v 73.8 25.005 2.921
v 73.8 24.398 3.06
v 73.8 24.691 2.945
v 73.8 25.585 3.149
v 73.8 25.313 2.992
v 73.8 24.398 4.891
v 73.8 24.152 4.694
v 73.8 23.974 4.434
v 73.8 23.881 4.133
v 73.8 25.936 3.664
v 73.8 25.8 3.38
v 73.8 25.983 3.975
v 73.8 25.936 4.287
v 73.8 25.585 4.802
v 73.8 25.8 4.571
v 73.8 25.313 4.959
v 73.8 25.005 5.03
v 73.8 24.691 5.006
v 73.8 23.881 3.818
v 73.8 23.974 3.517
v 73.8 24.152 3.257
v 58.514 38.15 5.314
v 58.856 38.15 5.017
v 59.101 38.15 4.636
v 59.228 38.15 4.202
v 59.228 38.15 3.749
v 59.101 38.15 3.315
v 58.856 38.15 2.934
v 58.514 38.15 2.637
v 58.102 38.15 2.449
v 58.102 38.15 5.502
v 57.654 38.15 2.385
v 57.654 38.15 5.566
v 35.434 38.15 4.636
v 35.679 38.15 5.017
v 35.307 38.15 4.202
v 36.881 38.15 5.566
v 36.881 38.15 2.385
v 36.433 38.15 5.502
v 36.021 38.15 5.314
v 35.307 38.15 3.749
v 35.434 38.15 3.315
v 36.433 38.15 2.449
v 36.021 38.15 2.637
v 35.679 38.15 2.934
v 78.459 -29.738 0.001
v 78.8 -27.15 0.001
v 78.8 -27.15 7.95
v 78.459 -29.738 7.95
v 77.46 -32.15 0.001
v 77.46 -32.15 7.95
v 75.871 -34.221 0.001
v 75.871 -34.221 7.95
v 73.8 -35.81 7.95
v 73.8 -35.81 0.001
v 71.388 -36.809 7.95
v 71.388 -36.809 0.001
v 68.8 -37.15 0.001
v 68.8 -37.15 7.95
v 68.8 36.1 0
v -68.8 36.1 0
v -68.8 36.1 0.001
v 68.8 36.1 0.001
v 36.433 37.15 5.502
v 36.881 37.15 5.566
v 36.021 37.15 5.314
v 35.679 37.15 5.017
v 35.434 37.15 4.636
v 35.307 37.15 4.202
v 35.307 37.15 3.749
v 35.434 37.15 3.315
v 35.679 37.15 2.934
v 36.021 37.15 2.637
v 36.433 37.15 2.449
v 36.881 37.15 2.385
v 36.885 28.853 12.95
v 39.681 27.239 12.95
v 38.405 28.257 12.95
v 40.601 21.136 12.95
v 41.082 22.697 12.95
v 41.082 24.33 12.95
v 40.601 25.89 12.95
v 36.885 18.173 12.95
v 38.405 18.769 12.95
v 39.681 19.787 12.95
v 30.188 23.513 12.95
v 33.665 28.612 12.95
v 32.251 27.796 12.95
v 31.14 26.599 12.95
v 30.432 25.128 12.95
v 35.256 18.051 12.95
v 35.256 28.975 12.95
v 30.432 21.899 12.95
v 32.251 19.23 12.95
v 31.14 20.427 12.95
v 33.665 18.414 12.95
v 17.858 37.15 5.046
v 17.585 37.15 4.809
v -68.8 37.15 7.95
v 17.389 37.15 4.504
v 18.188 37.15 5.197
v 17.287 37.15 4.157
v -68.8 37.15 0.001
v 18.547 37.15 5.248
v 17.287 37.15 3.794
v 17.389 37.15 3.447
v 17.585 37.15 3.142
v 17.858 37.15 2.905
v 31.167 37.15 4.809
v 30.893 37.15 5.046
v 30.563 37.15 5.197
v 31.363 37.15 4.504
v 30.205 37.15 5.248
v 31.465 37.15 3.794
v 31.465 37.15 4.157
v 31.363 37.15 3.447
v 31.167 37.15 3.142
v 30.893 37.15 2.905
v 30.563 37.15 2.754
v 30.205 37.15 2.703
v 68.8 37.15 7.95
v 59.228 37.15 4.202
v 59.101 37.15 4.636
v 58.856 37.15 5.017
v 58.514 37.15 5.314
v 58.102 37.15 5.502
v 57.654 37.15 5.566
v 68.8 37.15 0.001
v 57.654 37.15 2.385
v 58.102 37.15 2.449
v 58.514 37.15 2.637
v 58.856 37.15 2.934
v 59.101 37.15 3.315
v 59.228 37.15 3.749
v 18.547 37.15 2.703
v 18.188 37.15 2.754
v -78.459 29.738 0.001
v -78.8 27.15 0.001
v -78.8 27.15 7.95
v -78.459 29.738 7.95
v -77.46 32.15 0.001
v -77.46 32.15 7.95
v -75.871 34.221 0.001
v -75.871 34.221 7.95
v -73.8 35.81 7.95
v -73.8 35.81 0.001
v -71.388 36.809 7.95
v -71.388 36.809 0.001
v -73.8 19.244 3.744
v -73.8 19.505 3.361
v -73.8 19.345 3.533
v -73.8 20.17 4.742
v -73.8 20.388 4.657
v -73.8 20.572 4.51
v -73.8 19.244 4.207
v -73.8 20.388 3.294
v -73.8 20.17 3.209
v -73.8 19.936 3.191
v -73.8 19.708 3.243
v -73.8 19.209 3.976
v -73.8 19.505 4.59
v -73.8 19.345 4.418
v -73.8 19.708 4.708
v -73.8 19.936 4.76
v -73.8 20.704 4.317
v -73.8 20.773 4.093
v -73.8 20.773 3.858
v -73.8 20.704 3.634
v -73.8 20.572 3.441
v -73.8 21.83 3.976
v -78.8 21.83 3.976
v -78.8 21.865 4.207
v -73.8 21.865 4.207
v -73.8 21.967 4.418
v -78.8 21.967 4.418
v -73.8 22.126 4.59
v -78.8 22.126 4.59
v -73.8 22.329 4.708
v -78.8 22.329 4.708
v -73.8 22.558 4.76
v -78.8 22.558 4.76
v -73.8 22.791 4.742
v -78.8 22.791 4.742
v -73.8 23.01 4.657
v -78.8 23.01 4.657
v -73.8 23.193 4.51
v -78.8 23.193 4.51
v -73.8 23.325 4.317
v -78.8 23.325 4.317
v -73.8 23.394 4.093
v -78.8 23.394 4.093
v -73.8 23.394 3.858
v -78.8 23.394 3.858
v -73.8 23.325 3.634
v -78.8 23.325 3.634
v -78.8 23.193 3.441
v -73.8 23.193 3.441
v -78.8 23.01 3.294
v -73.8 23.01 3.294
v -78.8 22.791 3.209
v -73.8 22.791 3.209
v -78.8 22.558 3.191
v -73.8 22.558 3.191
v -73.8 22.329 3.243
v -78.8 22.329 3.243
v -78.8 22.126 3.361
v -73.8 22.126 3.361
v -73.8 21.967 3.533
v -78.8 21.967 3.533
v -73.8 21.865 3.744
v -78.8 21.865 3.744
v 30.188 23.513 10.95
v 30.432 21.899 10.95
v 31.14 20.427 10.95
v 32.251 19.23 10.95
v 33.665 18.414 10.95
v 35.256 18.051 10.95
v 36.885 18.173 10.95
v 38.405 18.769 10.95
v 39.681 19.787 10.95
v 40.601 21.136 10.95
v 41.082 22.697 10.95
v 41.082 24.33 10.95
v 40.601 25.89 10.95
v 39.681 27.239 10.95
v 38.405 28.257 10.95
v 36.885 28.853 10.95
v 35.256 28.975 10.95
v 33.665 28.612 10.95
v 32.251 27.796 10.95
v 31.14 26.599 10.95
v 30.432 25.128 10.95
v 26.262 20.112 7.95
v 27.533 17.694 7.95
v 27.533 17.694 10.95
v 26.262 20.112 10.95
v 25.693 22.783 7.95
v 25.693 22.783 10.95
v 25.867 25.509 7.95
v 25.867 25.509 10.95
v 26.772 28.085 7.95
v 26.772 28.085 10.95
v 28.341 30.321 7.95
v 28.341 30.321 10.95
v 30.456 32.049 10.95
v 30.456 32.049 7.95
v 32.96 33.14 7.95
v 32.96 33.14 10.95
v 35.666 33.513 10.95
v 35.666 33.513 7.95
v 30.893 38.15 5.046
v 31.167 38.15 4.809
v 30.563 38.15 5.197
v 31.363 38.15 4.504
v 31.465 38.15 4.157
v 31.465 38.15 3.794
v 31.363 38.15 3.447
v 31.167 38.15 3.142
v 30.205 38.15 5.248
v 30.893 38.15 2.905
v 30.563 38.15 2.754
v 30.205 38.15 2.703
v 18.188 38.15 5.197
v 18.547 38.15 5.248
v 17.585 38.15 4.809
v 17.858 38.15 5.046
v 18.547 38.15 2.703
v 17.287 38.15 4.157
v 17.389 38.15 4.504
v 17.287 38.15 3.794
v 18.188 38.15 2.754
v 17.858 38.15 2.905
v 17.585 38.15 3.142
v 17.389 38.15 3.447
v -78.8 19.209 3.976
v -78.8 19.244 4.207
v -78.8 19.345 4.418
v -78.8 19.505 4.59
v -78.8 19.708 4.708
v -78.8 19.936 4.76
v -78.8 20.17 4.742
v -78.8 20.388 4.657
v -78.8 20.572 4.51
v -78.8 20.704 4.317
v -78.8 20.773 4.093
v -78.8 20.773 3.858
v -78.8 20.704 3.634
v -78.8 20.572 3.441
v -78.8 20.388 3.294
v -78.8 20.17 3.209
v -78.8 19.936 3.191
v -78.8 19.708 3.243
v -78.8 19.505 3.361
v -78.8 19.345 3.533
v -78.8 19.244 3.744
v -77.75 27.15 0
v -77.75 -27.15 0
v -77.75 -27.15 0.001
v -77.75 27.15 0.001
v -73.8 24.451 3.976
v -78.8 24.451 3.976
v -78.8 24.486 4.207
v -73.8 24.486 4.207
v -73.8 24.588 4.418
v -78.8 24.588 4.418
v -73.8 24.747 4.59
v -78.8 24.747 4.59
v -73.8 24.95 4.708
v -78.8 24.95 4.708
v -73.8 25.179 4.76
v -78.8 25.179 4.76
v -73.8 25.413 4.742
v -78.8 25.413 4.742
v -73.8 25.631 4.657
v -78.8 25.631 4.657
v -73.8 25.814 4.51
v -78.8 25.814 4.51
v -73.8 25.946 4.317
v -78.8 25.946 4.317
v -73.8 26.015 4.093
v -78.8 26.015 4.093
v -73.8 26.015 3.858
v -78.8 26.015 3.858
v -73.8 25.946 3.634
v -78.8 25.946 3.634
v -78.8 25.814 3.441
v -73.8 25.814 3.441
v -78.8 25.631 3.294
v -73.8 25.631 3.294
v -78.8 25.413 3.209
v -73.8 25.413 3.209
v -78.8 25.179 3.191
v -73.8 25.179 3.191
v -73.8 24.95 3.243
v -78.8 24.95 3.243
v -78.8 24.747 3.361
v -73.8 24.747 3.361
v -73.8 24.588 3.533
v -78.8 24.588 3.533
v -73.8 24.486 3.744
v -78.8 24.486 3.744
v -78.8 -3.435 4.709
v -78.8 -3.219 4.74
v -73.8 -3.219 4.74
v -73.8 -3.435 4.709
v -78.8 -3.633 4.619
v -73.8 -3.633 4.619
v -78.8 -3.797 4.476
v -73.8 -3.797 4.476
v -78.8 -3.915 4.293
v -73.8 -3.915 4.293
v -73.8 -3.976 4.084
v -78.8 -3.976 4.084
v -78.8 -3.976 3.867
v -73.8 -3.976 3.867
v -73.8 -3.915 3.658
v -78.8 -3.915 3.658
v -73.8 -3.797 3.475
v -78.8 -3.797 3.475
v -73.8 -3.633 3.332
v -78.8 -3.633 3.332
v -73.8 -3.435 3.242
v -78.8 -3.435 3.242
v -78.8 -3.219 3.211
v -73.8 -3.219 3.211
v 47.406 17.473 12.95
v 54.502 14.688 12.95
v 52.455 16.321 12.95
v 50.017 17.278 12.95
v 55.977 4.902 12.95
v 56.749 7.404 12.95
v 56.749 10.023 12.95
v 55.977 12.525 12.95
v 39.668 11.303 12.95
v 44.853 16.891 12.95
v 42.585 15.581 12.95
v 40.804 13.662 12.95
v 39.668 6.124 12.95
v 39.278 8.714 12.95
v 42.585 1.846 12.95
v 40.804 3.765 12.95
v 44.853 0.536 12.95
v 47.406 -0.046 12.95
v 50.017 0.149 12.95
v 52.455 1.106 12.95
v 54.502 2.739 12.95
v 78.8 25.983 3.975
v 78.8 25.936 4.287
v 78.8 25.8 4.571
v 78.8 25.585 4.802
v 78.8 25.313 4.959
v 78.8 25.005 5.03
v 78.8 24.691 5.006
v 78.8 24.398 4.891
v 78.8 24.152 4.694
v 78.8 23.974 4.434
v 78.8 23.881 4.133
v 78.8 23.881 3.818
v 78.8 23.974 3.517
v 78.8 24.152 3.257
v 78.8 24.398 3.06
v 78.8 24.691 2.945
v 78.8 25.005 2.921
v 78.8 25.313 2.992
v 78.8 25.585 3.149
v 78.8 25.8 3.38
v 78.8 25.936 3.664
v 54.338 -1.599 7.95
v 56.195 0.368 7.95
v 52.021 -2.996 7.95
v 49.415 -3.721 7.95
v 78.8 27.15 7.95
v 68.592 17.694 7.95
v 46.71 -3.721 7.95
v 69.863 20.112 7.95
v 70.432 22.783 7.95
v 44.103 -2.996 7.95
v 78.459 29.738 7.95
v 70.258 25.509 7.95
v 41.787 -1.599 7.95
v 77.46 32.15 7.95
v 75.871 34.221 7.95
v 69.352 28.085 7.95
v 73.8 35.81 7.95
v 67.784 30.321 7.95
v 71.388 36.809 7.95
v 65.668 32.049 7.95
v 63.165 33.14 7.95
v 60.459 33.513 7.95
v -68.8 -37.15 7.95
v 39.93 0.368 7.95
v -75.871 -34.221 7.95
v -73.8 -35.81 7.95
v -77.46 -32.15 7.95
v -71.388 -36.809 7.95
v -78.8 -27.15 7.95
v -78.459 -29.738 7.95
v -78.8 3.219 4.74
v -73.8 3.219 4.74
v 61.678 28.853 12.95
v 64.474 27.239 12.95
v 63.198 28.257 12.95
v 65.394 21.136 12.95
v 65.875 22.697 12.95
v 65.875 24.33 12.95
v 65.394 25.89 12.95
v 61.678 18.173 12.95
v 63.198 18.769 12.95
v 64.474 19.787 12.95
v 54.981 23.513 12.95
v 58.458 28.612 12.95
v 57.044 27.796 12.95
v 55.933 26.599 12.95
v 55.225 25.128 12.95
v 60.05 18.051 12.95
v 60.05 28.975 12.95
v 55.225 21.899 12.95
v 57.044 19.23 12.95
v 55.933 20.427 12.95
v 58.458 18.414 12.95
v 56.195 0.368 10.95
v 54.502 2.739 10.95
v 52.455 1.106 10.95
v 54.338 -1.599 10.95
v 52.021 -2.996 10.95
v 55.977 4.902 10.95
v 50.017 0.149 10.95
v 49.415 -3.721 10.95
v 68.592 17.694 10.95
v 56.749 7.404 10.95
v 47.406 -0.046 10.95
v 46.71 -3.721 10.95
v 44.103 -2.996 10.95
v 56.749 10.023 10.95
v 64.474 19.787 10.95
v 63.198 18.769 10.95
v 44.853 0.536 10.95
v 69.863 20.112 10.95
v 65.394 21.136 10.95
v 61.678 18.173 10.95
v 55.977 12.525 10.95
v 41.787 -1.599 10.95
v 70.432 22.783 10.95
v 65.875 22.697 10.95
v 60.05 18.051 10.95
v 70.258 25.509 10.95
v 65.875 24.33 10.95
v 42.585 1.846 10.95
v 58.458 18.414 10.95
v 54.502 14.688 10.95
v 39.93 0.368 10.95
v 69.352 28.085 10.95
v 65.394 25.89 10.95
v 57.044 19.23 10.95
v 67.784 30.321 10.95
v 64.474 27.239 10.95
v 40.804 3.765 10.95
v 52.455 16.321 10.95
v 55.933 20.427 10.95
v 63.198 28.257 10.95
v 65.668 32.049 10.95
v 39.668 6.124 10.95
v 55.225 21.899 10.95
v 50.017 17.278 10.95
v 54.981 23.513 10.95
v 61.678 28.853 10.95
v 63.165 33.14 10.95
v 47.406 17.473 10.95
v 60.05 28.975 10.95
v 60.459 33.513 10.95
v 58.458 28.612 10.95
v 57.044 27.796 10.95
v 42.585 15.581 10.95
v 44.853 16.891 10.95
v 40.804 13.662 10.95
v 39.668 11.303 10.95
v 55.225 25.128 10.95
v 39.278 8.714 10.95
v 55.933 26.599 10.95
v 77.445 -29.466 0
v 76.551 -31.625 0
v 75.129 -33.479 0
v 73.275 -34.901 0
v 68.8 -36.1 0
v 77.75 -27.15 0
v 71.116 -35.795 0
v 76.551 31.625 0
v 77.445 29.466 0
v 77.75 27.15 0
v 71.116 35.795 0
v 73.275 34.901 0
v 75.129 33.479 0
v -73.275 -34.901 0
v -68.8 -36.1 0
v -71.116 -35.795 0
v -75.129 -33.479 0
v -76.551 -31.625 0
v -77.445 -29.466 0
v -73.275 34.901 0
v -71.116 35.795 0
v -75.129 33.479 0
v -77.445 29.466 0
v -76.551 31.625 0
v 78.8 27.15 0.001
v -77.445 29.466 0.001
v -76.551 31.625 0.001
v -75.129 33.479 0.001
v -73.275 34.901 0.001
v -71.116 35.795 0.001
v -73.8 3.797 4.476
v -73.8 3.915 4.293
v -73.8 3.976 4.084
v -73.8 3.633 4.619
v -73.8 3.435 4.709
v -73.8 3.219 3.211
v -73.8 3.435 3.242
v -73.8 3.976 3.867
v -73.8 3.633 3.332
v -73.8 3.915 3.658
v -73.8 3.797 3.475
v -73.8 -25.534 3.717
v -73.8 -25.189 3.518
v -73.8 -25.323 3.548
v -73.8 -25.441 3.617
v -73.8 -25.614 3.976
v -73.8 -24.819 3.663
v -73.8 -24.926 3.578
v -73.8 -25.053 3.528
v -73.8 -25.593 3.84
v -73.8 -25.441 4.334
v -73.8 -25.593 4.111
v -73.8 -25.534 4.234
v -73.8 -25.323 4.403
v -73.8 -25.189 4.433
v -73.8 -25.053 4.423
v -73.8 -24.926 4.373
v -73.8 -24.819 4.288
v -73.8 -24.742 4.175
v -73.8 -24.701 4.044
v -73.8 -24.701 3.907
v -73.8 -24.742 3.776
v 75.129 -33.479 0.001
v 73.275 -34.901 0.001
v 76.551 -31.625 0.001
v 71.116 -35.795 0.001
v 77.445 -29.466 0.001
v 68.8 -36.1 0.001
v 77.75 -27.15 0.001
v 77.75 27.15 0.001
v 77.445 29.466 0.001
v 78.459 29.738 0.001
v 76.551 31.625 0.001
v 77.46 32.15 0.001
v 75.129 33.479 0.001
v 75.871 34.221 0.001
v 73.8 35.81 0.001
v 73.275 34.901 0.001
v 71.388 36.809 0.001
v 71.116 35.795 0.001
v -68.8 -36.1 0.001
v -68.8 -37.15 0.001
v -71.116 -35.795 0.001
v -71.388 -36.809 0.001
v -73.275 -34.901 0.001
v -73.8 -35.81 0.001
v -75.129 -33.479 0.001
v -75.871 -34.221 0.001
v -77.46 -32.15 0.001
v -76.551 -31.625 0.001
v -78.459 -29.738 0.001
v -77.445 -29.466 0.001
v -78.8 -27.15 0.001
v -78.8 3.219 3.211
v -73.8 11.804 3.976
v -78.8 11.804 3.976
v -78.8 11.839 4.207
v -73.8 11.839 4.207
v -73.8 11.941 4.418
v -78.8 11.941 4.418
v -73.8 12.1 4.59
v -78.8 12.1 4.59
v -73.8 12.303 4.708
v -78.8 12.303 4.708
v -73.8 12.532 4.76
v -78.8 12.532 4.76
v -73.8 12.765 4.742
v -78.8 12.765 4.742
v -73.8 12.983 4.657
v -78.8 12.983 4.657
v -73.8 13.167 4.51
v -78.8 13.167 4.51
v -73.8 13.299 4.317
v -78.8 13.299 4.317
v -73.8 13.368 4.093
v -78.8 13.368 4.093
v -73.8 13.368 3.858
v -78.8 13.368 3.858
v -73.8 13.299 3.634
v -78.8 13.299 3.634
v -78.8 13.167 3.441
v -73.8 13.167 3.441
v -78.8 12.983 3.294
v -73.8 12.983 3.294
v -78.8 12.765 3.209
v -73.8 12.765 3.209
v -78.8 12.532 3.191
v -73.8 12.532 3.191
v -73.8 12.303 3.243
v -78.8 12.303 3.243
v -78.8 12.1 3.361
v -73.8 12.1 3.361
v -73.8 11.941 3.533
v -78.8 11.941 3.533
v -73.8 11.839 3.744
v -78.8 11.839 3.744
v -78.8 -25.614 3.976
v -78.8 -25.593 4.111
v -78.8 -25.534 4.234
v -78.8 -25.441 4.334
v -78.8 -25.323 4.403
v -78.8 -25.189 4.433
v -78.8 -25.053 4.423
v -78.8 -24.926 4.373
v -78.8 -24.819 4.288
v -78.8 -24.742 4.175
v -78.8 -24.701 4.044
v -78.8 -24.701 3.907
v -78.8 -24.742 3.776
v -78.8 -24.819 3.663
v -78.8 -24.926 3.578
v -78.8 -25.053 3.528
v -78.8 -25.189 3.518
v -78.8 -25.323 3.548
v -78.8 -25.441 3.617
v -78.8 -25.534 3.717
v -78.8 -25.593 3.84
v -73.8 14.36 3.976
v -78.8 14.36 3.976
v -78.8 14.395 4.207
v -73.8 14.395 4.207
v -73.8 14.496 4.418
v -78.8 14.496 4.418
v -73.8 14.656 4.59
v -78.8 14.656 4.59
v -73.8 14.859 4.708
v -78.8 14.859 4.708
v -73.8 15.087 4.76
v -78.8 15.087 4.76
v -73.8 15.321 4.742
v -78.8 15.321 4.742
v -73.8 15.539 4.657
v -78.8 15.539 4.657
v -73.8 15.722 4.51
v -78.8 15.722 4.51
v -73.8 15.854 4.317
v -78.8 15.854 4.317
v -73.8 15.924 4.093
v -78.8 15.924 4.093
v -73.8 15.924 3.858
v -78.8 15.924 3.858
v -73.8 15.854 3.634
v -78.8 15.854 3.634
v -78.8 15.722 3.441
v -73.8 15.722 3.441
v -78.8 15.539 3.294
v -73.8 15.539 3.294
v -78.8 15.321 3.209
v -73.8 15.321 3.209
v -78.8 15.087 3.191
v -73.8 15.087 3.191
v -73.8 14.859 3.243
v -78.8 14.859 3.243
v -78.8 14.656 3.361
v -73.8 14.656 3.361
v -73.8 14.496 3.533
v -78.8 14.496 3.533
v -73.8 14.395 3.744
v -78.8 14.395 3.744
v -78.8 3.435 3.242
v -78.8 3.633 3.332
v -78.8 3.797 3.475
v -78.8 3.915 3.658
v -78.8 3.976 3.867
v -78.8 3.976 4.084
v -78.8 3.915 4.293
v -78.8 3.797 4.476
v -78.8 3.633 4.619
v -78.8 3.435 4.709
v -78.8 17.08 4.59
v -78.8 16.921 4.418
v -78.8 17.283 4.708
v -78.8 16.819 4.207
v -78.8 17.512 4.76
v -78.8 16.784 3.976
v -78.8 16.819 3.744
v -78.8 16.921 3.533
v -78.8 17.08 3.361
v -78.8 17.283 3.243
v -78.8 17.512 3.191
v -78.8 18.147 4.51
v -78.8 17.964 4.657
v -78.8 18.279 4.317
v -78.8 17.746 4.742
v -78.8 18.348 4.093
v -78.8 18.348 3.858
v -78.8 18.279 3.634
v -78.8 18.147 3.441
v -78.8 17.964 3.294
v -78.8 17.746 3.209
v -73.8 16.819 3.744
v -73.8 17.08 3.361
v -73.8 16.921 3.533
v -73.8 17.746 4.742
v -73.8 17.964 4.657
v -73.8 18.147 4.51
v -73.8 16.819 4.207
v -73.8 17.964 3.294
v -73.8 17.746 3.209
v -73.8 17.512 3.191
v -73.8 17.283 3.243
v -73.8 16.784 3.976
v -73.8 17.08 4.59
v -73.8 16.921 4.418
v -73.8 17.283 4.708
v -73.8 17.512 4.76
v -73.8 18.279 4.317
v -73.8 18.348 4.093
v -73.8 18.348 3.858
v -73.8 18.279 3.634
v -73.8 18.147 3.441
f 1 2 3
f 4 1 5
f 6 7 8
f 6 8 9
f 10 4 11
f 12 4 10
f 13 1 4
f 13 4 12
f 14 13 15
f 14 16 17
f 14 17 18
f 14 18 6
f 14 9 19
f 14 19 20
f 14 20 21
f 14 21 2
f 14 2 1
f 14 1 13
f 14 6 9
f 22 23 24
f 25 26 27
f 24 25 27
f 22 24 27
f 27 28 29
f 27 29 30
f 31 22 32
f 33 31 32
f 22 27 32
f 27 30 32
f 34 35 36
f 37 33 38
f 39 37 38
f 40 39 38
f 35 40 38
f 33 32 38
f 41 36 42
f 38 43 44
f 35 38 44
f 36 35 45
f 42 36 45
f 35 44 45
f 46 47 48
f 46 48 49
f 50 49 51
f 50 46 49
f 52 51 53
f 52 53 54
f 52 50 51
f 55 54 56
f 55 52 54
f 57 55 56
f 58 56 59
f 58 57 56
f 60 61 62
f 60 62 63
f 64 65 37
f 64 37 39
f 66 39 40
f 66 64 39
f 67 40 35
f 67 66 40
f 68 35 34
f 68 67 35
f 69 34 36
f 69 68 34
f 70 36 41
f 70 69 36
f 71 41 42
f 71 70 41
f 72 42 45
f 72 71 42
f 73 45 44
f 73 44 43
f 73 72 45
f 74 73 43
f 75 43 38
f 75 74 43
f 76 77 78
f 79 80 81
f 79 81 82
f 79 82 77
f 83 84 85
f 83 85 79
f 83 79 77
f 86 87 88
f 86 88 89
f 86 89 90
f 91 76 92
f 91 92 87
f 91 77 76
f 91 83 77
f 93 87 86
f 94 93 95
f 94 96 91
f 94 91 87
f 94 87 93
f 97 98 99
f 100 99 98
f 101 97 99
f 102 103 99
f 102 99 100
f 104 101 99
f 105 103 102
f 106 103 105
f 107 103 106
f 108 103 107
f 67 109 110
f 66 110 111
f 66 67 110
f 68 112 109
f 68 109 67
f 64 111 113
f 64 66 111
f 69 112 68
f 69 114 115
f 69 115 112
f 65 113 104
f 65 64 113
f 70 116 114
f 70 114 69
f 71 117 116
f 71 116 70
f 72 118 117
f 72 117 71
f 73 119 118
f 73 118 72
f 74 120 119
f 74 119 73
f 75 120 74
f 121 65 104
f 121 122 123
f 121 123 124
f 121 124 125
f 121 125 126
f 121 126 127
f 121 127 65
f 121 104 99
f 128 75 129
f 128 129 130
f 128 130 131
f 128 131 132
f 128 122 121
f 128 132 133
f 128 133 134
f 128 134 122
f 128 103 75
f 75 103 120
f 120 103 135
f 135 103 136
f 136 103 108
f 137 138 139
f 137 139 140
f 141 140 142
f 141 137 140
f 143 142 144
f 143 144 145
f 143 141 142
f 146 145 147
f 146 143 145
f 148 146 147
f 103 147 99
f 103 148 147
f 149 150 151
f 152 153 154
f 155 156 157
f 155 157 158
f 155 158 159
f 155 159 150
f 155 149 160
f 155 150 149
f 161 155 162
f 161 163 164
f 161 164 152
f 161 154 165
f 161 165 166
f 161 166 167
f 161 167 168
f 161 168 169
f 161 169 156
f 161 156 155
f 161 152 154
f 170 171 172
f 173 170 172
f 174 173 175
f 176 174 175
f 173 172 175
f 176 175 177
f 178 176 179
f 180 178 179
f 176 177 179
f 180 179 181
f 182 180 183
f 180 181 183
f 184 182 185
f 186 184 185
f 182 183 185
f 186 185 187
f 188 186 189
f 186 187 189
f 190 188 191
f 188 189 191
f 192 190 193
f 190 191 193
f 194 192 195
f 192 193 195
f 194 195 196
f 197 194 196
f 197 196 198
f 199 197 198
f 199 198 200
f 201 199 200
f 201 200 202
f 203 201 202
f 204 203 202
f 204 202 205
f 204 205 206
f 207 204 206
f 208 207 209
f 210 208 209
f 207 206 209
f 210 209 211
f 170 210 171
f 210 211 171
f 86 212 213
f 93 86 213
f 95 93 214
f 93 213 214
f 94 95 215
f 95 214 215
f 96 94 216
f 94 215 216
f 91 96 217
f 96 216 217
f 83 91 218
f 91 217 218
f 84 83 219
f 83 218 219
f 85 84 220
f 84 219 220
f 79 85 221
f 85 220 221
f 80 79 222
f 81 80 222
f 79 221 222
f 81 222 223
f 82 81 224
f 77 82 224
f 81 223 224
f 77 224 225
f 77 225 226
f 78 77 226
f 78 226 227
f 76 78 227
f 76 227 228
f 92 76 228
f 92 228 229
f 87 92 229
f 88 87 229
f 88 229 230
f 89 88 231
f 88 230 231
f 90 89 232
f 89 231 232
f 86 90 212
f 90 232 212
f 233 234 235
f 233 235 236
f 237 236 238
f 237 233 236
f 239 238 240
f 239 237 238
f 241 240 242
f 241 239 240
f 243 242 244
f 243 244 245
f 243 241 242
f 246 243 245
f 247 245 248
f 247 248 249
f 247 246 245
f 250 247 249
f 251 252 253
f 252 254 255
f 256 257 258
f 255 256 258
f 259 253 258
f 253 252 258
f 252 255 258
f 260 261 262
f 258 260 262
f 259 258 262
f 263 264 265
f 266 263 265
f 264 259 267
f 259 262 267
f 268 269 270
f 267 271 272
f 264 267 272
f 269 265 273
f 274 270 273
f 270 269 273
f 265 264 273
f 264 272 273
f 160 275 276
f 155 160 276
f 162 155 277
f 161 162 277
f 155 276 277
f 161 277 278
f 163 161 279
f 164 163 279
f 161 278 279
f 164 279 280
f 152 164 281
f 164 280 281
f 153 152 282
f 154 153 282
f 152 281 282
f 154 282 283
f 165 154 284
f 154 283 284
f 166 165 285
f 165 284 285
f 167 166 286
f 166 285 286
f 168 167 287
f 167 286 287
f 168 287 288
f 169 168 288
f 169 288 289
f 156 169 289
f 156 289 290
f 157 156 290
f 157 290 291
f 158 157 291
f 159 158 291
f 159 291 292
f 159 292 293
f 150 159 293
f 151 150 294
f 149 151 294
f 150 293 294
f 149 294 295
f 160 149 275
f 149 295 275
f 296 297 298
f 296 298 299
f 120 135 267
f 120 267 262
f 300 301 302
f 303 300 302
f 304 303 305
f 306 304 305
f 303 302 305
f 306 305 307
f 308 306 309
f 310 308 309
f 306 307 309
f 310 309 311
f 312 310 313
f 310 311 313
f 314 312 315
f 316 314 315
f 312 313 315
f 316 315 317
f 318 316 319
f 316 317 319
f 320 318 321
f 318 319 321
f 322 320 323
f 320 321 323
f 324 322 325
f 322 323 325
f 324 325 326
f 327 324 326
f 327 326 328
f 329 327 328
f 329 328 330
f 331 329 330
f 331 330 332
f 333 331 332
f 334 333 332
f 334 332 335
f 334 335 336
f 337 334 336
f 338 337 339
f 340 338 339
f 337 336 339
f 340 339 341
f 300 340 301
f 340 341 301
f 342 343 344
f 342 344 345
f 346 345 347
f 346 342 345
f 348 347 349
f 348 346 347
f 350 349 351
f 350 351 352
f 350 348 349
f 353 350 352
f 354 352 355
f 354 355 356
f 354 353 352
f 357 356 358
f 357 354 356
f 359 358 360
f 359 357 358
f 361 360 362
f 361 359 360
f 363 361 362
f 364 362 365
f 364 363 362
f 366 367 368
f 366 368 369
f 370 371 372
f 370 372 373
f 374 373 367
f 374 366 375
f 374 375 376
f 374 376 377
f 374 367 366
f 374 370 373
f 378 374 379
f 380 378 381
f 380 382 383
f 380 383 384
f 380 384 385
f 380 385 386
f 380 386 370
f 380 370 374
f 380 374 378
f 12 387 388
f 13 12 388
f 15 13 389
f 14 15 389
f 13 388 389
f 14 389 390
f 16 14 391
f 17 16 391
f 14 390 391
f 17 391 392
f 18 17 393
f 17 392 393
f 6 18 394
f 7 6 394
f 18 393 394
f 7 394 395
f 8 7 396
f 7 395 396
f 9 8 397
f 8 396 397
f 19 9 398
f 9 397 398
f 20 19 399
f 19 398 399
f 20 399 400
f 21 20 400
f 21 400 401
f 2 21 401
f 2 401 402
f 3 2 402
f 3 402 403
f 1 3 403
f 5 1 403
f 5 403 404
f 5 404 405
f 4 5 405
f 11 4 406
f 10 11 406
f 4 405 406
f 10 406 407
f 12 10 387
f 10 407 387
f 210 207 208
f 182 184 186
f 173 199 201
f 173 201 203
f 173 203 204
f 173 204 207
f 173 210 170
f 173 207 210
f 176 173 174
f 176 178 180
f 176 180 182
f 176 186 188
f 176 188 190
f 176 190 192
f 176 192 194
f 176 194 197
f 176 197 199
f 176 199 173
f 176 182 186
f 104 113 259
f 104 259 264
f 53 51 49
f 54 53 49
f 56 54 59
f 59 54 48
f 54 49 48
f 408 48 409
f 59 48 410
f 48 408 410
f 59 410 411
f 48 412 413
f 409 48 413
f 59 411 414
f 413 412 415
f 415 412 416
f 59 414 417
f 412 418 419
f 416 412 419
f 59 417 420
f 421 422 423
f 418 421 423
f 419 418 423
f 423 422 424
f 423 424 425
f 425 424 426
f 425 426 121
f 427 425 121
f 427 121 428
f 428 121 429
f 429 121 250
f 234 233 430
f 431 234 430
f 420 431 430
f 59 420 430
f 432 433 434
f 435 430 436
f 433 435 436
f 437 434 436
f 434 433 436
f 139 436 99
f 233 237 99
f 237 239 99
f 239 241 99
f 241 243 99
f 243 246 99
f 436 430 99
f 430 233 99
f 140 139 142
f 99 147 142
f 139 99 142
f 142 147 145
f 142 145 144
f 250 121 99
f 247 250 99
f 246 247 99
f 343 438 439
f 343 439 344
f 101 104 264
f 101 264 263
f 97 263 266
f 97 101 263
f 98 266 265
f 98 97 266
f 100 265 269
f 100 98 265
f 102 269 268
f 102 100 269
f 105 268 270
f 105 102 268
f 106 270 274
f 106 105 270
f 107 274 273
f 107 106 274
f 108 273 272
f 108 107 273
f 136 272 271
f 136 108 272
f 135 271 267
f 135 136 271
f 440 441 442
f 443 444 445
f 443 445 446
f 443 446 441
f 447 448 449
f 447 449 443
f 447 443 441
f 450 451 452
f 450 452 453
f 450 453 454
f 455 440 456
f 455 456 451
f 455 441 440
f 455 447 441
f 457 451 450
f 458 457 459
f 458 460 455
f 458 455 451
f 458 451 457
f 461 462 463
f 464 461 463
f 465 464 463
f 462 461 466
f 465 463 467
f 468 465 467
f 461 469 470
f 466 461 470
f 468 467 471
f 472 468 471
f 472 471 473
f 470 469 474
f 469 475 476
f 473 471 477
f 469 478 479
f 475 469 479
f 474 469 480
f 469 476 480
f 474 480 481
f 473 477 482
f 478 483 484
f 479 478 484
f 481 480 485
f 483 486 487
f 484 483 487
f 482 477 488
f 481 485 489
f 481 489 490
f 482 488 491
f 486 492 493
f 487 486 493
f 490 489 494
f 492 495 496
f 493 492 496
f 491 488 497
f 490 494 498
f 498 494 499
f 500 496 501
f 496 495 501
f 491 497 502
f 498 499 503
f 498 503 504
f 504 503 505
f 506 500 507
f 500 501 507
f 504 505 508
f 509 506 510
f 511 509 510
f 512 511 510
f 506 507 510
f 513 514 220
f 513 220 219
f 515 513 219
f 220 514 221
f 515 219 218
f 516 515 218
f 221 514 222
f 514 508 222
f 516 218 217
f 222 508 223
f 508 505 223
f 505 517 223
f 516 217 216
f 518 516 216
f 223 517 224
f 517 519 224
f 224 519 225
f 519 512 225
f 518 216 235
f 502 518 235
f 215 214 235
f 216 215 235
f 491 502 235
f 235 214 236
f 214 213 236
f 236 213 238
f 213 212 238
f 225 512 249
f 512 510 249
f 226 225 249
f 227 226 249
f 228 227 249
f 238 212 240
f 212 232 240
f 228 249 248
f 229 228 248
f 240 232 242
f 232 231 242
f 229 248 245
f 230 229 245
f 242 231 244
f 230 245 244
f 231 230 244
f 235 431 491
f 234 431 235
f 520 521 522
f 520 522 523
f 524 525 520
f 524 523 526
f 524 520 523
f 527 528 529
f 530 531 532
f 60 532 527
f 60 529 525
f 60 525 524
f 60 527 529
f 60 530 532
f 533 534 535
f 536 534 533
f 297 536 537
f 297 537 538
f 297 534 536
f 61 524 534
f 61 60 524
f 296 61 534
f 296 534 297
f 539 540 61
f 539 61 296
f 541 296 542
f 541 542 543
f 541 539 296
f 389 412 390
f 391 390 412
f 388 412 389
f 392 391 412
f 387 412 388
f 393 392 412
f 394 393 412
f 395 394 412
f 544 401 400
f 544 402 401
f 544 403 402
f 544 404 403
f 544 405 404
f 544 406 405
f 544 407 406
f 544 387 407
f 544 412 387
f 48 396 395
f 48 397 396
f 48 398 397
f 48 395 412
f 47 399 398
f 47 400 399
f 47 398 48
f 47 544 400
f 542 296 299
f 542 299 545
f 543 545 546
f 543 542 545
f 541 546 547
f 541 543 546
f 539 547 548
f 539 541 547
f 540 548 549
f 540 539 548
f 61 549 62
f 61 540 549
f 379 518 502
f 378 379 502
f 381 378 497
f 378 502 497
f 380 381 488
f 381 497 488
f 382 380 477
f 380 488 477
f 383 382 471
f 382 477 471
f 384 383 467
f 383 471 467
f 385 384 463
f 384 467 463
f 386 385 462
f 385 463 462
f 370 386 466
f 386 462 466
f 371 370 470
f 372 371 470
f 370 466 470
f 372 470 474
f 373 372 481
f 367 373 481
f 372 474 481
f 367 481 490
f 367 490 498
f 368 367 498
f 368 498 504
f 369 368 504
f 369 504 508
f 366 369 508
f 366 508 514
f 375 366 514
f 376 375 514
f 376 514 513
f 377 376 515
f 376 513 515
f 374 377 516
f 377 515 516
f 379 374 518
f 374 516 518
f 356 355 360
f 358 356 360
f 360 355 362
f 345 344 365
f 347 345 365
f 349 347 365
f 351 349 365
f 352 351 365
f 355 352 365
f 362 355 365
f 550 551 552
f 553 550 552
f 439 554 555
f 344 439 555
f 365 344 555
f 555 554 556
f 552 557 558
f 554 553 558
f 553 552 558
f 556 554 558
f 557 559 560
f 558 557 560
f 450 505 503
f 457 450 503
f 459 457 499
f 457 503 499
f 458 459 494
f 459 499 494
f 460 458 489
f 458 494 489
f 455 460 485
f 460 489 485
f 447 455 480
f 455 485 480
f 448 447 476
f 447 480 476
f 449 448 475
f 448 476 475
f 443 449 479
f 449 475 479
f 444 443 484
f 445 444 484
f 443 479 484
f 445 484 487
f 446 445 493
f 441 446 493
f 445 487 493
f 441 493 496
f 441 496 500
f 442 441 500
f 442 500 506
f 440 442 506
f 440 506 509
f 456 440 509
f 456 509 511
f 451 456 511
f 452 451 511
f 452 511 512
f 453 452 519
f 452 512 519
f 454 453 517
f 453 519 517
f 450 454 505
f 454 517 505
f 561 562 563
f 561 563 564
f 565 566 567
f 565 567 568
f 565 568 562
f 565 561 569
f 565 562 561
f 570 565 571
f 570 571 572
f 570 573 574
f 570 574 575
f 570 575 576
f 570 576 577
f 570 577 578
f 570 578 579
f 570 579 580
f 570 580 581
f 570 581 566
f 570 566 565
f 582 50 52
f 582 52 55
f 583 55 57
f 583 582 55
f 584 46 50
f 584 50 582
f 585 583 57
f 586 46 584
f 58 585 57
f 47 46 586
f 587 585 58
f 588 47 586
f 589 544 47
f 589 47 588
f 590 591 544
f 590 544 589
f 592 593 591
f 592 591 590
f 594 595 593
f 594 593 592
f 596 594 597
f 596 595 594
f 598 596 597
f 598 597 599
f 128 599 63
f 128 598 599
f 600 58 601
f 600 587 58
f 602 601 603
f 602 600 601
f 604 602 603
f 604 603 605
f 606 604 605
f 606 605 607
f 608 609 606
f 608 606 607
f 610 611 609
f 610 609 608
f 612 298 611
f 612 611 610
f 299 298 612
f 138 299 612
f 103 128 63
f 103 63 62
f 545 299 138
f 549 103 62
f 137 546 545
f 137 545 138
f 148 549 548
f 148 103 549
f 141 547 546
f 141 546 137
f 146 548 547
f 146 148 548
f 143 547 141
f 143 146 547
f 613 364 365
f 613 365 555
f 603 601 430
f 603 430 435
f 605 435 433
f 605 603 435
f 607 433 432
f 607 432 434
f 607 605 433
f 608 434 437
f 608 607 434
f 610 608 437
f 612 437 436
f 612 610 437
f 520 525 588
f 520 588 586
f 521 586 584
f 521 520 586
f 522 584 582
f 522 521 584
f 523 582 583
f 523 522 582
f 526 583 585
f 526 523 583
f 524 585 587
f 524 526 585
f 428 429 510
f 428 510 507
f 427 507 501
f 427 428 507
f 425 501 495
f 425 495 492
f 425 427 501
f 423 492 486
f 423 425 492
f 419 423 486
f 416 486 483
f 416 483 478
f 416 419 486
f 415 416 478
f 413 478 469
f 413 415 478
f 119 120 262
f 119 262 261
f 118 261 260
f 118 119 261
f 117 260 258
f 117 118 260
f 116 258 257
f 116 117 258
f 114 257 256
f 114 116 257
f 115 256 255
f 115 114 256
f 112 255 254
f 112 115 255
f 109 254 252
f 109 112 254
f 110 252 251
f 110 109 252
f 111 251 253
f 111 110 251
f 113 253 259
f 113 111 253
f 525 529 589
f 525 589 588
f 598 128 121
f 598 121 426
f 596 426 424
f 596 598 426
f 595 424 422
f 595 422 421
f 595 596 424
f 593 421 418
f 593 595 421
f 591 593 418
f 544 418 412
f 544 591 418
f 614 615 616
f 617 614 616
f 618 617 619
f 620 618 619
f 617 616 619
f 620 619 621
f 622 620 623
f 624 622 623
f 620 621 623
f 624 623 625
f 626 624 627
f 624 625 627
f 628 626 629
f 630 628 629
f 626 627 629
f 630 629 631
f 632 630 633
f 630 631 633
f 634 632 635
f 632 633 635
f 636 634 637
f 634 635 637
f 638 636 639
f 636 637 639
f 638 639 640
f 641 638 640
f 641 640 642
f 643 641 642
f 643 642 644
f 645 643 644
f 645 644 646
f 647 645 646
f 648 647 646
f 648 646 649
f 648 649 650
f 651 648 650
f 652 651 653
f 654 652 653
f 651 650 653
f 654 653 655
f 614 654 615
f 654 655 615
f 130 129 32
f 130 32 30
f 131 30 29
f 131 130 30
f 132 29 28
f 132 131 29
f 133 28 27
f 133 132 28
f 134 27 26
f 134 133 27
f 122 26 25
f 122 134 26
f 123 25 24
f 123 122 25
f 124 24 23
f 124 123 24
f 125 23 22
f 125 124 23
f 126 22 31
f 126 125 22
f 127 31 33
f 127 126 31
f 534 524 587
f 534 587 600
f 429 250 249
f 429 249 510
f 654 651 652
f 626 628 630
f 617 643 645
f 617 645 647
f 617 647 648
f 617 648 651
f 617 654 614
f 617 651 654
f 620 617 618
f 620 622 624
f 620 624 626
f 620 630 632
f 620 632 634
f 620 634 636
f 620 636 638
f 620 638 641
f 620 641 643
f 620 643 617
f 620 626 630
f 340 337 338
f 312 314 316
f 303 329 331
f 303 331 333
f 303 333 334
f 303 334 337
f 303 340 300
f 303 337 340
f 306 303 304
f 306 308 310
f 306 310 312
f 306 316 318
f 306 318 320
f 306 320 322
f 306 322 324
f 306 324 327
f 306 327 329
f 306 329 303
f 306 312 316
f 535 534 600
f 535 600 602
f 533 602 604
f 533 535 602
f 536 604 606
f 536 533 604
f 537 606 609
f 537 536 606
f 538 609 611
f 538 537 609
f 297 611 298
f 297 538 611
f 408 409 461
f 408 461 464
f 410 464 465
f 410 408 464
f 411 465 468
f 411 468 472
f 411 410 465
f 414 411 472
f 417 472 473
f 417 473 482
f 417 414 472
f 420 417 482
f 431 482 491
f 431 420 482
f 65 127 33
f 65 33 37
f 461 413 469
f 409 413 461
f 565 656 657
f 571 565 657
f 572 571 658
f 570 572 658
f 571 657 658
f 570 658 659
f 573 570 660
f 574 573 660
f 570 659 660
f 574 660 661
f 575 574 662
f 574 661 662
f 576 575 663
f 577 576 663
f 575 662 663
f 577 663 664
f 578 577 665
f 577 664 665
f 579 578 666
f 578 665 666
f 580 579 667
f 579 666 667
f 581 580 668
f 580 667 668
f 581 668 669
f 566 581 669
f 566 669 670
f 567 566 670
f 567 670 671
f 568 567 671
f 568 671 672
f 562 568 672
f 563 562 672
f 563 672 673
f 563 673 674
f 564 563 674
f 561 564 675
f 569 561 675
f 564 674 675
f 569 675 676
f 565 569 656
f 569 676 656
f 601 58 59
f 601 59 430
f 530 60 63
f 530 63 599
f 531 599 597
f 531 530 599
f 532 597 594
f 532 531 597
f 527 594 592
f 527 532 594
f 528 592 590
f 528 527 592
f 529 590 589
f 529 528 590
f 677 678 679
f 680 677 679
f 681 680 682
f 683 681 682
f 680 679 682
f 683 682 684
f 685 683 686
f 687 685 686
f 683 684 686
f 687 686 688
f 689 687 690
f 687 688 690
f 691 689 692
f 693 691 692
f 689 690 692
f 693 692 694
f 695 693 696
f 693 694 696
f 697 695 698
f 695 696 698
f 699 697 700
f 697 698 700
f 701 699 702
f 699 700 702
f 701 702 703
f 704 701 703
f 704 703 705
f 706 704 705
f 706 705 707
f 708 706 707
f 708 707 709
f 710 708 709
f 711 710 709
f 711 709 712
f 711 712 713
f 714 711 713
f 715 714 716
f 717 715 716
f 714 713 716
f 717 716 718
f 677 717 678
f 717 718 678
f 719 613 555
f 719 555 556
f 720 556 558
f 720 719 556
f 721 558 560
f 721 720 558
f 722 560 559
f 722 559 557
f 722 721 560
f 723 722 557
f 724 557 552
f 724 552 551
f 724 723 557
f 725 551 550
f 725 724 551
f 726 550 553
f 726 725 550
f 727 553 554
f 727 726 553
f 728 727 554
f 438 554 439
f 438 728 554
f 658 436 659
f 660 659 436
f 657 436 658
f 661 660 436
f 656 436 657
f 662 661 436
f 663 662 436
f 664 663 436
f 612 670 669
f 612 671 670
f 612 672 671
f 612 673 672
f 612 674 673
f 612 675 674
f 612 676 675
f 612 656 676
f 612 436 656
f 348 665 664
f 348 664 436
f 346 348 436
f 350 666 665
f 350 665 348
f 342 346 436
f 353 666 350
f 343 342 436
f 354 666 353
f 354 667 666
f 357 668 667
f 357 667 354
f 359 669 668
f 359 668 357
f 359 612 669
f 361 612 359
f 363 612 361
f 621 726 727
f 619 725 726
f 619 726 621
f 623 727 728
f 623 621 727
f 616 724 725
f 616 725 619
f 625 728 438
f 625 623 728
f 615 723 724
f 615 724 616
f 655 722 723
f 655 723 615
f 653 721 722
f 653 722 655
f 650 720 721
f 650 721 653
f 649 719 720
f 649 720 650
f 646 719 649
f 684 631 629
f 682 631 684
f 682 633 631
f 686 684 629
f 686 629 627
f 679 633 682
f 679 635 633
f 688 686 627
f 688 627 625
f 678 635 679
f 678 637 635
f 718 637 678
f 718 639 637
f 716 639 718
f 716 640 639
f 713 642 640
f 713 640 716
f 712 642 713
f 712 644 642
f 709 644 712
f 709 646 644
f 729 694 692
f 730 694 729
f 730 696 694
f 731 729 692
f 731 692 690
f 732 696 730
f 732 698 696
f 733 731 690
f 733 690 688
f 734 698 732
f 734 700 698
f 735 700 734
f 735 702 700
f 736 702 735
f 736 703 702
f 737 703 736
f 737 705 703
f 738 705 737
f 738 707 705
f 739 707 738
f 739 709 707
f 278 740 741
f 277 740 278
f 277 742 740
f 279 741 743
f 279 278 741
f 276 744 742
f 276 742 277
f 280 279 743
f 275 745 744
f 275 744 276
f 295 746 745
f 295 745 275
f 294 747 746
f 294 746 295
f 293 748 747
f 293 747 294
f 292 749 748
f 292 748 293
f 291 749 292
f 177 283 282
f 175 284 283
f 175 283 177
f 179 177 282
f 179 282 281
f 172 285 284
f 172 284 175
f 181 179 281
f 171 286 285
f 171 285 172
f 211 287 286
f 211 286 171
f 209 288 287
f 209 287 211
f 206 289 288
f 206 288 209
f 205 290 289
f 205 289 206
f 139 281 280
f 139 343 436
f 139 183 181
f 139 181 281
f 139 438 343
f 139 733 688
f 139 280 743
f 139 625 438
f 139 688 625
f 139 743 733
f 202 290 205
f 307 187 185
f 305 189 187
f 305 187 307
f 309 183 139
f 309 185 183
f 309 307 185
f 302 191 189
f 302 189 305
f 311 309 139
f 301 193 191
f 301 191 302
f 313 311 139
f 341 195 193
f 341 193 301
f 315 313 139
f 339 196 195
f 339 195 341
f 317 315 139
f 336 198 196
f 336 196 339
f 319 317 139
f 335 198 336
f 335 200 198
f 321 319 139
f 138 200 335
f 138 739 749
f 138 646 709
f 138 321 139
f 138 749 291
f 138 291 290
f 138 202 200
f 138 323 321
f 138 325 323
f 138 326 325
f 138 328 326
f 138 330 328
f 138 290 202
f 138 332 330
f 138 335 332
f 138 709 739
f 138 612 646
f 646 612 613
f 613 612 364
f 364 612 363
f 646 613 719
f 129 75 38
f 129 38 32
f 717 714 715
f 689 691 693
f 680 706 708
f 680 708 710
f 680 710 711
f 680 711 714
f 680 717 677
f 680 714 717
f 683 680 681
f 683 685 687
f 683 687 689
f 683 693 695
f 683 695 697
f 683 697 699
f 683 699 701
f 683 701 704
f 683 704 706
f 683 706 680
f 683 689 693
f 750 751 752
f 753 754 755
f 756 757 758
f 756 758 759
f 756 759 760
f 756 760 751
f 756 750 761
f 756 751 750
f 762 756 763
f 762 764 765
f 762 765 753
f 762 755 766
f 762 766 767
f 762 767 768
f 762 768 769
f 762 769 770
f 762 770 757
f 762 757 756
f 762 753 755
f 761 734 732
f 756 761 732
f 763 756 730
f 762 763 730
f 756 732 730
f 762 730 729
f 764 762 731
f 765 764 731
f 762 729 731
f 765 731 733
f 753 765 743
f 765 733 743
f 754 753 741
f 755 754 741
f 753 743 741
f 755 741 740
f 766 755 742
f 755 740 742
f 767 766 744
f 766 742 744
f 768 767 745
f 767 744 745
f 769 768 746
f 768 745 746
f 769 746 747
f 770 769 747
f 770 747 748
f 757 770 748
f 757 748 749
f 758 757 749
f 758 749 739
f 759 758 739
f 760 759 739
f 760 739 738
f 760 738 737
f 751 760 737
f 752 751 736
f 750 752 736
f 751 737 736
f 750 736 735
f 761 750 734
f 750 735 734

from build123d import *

# Parameters (mm, degrees)
EXTRUDE_1_DEPTH      = 7.95
SKETCH_3_OUTSIDE_W   = 194.484
SKETCH_3_OUTSIDE_H   = 111.184
CUT_EXTRUDE_11_DEPTH = 0.001
SKETCH_5_R           = 1.056956527
CUT_EXTRUDE_12_DEPTH = 5
EXTRUDE_2_DEPTH      = 1
CUT_EXTRUDE_13_DEPTH = 5
SKETCH_8_R           = 0.78636109
CUT_EXTRUDE_14_DEPTH = 5
SKETCH_11_R          = 0.458710636
CUT_EXTRUDE_15_DEPTH = 5
EXTRUDE_3_DEPTH      = 3
SKETCH_14_R          = 8.784302199
SKETCH_14_R_2        = 5.477679508
EXTRUDE_4_DEPTH      = 2


with BuildPart() as part:
    # 草图1 → 凸台-拉伸1 (new body)
    with BuildSketch(Plane.XY):
        with BuildLine():
            Line((-68.8, 37.15), (68.8, 37.15))
            ThreePointArc((68.8, 37.15), (75.871067812, 34.221067812), (78.8, 27.15))
            Line((78.8, 27.15), (78.8, -27.15))
            ThreePointArc((78.8, -27.15), (75.871067812, -34.221067812), (68.8, -37.15))
            Line((68.8, -37.15), (-68.8, -37.15))
            ThreePointArc((-68.8, -37.15), (-75.871067812, -34.221067812), (-78.8, -27.15))
            Line((-78.8, -27.15), (-78.8, 27.15))
            ThreePointArc((-78.8, 27.15), (-75.871067812, 34.221067812), (-68.8, 37.15))
        make_face()
    extrude(amount=EXTRUDE_1_DEPTH)

    # 草图3 outside → 切除-拉伸11 (cut)
    with BuildSketch(Plane(origin=(0, 0, 0), x_dir=(-1, 0, 0), z_dir=(0, 0, -1))):
        Rectangle(SKETCH_3_OUTSIDE_W, SKETCH_3_OUTSIDE_H)
        with BuildLine():
            Line((-68.8, -36.1), (68.8, -36.1))
            ThreePointArc((68.8, -36.1), (75.128605692, -33.478605692), (77.75, -27.15))
            Line((77.75, -27.15), (77.75, 27.15))
            ThreePointArc((77.75, 27.15), (75.128605692, 33.478605692), (68.8, 36.1))
            Line((68.8, 36.1), (-68.8, 36.1))
            ThreePointArc((-68.8, 36.1), (-75.128605692, 33.478605692), (-77.75, 27.15))
            Line((-77.75, 27.15), (-77.75, -27.15))
            ThreePointArc((-77.75, -27.15), (-75.128605692, -33.478605692), (-68.8, -36.1))
        make_face(mode=Mode.SUBTRACT)
    extrude(amount=-CUT_EXTRUDE_11_DEPTH, mode=Mode.SUBTRACT)

    # 草图5 → 切除-拉伸12 (cut)
    with BuildSketch(Plane(origin=(78.8, 0, 0), x_dir=(0, 0, -1), z_dir=(1, 0, 0))):
        with Locations(Location((-3.9755, 24.926367293, 0), (0, 0, 90))):
            Circle(SKETCH_5_R)
    extrude(amount=-CUT_EXTRUDE_12_DEPTH, mode=Mode.SUBTRACT)

    # 草图6 → 凸台-拉伸2 (add)
    with BuildSketch(Plane(origin=(0, 37.15, 0), x_dir=(1, 0, 0), z_dir=(0, 1, 0))):
        with BuildLine():
            Line((36.881407925, -2.384573788), (57.653695148, -2.384573788))
            ThreePointArc((57.653695148, -2.384573788), (59.24462136, -3.9755), (57.653695148, -5.566426212))
            Line((57.653695148, -5.566426212), (36.881407925, -5.566426212))
            ThreePointArc((36.881407925, -5.566426212), (35.290481714, -3.9755), (36.881407925, -2.384573788))
        make_face()
        with BuildLine():
            Line((30.204601318, -5.24848304), (18.54668502, -5.24848304))
            ThreePointArc((18.54668502, -5.24848304), (17.27370198, -3.9755), (18.54668502, -2.70251696))
            Line((18.54668502, -2.70251696), (30.204601318, -2.70251696))
            ThreePointArc((30.204601318, -2.70251696), (31.477584358, -3.9755), (30.204601318, -5.24848304))
        make_face()
    extrude(amount=EXTRUDE_2_DEPTH)

    # 草图7 → 切除-拉伸13 (cut)
    with BuildSketch(Plane.ZY.offset(78.8)):
        with BuildLine():
            Line((3.210974453, -3.219498771), (3.210974453, 3.219498771))
            ThreePointArc((3.210974453, 3.219498771), (3.9755, 3.984024318), (4.740025547, 3.219498771))
            Line((4.740025547, 3.219498771), (4.740025547, -3.219498771))
            ThreePointArc((4.740025547, -3.219498771), (3.9755, -3.984024318), (3.210974453, -3.219498771))
        make_face()
    extrude(amount=-CUT_EXTRUDE_13_DEPTH, mode=Mode.SUBTRACT)

    # 草图8 → 切除-拉伸14 (cut)
    with BuildSketch(Plane.ZY.offset(78.8)):
        with Locations(Location((3.9755, 25.237609302, 0), (0, 0, 270))):
            Circle(SKETCH_8_R)
        with Locations(Location((3.9755, 22.616405668, 0), (0, 0, 270))):
            Circle(SKETCH_8_R)
        with Locations(Location((3.9755, 19.995202033, 0), (0, 0, 270))):
            Circle(SKETCH_8_R)
        with Locations(Location((3.9755, 17.570588671, 0), (0, 0, 270))):
            Circle(SKETCH_8_R)
        with Locations(Location((3.9755, 15.145975309, 0), (0, 0, 270))):
            Circle(SKETCH_8_R)
        with Locations(Location((3.9755, 12.590301765, 0), (0, 0, 270))):
            Circle(SKETCH_8_R)
    extrude(amount=-CUT_EXTRUDE_14_DEPTH, mode=Mode.SUBTRACT)

    # 草图11 → 切除-拉伸15 (cut)
    with BuildSketch(Plane.ZY.offset(78.8)):
        with Locations(Location((3.9755, -25.155030575, 0), (0, 0, 270))):
            Circle(SKETCH_11_R)
    extrude(amount=-CUT_EXTRUDE_15_DEPTH, mode=Mode.SUBTRACT)

    # 草图13 → 凸台-拉伸3 (add)
    with BuildSketch(Plane.XY.offset(7.95)):
        with BuildLine():
            Line((35.665823079, 33.513099336), (60.458995853, 33.513099336))
            ThreePointArc((60.458995853, 33.513099336), (69.352474106, 28.08541216), (68.591748787, 17.694308248))
            Line((68.591748787, 17.694308248), (56.1951624, 0.367964546))
            ThreePointArc((56.1951624, 0.367964546), (48.062409466, -3.813244367), (39.929656532, 0.367964546))
            Line((39.929656532, 0.367964546), (27.533070145, 17.694308248))
            ThreePointArc((27.533070145, 17.694308248), (26.772344826, 28.08541216), (35.665823079, 33.513099336))
        make_face()
    extrude(amount=EXTRUDE_3_DEPTH)

    # 草图14 → 凸台-拉伸4 (add)
    with BuildSketch(Plane.XY.offset(10.95)):
        with Locations(Location((48.062409466, 8.713531937, 0), (0, 0, 180))):
            Circle(SKETCH_14_R)
        with Locations(Location((35.665823079, 23.513099336, 0), (0, 0, 180))):
            Circle(SKETCH_14_R_2)
        with Locations(Location((60.458995853, 23.513099336, 0), (0, 0, 180))):
            Circle(SKETCH_14_R_2)
    extrude(amount=EXTRUDE_4_DEPTH)


solid = part.part
